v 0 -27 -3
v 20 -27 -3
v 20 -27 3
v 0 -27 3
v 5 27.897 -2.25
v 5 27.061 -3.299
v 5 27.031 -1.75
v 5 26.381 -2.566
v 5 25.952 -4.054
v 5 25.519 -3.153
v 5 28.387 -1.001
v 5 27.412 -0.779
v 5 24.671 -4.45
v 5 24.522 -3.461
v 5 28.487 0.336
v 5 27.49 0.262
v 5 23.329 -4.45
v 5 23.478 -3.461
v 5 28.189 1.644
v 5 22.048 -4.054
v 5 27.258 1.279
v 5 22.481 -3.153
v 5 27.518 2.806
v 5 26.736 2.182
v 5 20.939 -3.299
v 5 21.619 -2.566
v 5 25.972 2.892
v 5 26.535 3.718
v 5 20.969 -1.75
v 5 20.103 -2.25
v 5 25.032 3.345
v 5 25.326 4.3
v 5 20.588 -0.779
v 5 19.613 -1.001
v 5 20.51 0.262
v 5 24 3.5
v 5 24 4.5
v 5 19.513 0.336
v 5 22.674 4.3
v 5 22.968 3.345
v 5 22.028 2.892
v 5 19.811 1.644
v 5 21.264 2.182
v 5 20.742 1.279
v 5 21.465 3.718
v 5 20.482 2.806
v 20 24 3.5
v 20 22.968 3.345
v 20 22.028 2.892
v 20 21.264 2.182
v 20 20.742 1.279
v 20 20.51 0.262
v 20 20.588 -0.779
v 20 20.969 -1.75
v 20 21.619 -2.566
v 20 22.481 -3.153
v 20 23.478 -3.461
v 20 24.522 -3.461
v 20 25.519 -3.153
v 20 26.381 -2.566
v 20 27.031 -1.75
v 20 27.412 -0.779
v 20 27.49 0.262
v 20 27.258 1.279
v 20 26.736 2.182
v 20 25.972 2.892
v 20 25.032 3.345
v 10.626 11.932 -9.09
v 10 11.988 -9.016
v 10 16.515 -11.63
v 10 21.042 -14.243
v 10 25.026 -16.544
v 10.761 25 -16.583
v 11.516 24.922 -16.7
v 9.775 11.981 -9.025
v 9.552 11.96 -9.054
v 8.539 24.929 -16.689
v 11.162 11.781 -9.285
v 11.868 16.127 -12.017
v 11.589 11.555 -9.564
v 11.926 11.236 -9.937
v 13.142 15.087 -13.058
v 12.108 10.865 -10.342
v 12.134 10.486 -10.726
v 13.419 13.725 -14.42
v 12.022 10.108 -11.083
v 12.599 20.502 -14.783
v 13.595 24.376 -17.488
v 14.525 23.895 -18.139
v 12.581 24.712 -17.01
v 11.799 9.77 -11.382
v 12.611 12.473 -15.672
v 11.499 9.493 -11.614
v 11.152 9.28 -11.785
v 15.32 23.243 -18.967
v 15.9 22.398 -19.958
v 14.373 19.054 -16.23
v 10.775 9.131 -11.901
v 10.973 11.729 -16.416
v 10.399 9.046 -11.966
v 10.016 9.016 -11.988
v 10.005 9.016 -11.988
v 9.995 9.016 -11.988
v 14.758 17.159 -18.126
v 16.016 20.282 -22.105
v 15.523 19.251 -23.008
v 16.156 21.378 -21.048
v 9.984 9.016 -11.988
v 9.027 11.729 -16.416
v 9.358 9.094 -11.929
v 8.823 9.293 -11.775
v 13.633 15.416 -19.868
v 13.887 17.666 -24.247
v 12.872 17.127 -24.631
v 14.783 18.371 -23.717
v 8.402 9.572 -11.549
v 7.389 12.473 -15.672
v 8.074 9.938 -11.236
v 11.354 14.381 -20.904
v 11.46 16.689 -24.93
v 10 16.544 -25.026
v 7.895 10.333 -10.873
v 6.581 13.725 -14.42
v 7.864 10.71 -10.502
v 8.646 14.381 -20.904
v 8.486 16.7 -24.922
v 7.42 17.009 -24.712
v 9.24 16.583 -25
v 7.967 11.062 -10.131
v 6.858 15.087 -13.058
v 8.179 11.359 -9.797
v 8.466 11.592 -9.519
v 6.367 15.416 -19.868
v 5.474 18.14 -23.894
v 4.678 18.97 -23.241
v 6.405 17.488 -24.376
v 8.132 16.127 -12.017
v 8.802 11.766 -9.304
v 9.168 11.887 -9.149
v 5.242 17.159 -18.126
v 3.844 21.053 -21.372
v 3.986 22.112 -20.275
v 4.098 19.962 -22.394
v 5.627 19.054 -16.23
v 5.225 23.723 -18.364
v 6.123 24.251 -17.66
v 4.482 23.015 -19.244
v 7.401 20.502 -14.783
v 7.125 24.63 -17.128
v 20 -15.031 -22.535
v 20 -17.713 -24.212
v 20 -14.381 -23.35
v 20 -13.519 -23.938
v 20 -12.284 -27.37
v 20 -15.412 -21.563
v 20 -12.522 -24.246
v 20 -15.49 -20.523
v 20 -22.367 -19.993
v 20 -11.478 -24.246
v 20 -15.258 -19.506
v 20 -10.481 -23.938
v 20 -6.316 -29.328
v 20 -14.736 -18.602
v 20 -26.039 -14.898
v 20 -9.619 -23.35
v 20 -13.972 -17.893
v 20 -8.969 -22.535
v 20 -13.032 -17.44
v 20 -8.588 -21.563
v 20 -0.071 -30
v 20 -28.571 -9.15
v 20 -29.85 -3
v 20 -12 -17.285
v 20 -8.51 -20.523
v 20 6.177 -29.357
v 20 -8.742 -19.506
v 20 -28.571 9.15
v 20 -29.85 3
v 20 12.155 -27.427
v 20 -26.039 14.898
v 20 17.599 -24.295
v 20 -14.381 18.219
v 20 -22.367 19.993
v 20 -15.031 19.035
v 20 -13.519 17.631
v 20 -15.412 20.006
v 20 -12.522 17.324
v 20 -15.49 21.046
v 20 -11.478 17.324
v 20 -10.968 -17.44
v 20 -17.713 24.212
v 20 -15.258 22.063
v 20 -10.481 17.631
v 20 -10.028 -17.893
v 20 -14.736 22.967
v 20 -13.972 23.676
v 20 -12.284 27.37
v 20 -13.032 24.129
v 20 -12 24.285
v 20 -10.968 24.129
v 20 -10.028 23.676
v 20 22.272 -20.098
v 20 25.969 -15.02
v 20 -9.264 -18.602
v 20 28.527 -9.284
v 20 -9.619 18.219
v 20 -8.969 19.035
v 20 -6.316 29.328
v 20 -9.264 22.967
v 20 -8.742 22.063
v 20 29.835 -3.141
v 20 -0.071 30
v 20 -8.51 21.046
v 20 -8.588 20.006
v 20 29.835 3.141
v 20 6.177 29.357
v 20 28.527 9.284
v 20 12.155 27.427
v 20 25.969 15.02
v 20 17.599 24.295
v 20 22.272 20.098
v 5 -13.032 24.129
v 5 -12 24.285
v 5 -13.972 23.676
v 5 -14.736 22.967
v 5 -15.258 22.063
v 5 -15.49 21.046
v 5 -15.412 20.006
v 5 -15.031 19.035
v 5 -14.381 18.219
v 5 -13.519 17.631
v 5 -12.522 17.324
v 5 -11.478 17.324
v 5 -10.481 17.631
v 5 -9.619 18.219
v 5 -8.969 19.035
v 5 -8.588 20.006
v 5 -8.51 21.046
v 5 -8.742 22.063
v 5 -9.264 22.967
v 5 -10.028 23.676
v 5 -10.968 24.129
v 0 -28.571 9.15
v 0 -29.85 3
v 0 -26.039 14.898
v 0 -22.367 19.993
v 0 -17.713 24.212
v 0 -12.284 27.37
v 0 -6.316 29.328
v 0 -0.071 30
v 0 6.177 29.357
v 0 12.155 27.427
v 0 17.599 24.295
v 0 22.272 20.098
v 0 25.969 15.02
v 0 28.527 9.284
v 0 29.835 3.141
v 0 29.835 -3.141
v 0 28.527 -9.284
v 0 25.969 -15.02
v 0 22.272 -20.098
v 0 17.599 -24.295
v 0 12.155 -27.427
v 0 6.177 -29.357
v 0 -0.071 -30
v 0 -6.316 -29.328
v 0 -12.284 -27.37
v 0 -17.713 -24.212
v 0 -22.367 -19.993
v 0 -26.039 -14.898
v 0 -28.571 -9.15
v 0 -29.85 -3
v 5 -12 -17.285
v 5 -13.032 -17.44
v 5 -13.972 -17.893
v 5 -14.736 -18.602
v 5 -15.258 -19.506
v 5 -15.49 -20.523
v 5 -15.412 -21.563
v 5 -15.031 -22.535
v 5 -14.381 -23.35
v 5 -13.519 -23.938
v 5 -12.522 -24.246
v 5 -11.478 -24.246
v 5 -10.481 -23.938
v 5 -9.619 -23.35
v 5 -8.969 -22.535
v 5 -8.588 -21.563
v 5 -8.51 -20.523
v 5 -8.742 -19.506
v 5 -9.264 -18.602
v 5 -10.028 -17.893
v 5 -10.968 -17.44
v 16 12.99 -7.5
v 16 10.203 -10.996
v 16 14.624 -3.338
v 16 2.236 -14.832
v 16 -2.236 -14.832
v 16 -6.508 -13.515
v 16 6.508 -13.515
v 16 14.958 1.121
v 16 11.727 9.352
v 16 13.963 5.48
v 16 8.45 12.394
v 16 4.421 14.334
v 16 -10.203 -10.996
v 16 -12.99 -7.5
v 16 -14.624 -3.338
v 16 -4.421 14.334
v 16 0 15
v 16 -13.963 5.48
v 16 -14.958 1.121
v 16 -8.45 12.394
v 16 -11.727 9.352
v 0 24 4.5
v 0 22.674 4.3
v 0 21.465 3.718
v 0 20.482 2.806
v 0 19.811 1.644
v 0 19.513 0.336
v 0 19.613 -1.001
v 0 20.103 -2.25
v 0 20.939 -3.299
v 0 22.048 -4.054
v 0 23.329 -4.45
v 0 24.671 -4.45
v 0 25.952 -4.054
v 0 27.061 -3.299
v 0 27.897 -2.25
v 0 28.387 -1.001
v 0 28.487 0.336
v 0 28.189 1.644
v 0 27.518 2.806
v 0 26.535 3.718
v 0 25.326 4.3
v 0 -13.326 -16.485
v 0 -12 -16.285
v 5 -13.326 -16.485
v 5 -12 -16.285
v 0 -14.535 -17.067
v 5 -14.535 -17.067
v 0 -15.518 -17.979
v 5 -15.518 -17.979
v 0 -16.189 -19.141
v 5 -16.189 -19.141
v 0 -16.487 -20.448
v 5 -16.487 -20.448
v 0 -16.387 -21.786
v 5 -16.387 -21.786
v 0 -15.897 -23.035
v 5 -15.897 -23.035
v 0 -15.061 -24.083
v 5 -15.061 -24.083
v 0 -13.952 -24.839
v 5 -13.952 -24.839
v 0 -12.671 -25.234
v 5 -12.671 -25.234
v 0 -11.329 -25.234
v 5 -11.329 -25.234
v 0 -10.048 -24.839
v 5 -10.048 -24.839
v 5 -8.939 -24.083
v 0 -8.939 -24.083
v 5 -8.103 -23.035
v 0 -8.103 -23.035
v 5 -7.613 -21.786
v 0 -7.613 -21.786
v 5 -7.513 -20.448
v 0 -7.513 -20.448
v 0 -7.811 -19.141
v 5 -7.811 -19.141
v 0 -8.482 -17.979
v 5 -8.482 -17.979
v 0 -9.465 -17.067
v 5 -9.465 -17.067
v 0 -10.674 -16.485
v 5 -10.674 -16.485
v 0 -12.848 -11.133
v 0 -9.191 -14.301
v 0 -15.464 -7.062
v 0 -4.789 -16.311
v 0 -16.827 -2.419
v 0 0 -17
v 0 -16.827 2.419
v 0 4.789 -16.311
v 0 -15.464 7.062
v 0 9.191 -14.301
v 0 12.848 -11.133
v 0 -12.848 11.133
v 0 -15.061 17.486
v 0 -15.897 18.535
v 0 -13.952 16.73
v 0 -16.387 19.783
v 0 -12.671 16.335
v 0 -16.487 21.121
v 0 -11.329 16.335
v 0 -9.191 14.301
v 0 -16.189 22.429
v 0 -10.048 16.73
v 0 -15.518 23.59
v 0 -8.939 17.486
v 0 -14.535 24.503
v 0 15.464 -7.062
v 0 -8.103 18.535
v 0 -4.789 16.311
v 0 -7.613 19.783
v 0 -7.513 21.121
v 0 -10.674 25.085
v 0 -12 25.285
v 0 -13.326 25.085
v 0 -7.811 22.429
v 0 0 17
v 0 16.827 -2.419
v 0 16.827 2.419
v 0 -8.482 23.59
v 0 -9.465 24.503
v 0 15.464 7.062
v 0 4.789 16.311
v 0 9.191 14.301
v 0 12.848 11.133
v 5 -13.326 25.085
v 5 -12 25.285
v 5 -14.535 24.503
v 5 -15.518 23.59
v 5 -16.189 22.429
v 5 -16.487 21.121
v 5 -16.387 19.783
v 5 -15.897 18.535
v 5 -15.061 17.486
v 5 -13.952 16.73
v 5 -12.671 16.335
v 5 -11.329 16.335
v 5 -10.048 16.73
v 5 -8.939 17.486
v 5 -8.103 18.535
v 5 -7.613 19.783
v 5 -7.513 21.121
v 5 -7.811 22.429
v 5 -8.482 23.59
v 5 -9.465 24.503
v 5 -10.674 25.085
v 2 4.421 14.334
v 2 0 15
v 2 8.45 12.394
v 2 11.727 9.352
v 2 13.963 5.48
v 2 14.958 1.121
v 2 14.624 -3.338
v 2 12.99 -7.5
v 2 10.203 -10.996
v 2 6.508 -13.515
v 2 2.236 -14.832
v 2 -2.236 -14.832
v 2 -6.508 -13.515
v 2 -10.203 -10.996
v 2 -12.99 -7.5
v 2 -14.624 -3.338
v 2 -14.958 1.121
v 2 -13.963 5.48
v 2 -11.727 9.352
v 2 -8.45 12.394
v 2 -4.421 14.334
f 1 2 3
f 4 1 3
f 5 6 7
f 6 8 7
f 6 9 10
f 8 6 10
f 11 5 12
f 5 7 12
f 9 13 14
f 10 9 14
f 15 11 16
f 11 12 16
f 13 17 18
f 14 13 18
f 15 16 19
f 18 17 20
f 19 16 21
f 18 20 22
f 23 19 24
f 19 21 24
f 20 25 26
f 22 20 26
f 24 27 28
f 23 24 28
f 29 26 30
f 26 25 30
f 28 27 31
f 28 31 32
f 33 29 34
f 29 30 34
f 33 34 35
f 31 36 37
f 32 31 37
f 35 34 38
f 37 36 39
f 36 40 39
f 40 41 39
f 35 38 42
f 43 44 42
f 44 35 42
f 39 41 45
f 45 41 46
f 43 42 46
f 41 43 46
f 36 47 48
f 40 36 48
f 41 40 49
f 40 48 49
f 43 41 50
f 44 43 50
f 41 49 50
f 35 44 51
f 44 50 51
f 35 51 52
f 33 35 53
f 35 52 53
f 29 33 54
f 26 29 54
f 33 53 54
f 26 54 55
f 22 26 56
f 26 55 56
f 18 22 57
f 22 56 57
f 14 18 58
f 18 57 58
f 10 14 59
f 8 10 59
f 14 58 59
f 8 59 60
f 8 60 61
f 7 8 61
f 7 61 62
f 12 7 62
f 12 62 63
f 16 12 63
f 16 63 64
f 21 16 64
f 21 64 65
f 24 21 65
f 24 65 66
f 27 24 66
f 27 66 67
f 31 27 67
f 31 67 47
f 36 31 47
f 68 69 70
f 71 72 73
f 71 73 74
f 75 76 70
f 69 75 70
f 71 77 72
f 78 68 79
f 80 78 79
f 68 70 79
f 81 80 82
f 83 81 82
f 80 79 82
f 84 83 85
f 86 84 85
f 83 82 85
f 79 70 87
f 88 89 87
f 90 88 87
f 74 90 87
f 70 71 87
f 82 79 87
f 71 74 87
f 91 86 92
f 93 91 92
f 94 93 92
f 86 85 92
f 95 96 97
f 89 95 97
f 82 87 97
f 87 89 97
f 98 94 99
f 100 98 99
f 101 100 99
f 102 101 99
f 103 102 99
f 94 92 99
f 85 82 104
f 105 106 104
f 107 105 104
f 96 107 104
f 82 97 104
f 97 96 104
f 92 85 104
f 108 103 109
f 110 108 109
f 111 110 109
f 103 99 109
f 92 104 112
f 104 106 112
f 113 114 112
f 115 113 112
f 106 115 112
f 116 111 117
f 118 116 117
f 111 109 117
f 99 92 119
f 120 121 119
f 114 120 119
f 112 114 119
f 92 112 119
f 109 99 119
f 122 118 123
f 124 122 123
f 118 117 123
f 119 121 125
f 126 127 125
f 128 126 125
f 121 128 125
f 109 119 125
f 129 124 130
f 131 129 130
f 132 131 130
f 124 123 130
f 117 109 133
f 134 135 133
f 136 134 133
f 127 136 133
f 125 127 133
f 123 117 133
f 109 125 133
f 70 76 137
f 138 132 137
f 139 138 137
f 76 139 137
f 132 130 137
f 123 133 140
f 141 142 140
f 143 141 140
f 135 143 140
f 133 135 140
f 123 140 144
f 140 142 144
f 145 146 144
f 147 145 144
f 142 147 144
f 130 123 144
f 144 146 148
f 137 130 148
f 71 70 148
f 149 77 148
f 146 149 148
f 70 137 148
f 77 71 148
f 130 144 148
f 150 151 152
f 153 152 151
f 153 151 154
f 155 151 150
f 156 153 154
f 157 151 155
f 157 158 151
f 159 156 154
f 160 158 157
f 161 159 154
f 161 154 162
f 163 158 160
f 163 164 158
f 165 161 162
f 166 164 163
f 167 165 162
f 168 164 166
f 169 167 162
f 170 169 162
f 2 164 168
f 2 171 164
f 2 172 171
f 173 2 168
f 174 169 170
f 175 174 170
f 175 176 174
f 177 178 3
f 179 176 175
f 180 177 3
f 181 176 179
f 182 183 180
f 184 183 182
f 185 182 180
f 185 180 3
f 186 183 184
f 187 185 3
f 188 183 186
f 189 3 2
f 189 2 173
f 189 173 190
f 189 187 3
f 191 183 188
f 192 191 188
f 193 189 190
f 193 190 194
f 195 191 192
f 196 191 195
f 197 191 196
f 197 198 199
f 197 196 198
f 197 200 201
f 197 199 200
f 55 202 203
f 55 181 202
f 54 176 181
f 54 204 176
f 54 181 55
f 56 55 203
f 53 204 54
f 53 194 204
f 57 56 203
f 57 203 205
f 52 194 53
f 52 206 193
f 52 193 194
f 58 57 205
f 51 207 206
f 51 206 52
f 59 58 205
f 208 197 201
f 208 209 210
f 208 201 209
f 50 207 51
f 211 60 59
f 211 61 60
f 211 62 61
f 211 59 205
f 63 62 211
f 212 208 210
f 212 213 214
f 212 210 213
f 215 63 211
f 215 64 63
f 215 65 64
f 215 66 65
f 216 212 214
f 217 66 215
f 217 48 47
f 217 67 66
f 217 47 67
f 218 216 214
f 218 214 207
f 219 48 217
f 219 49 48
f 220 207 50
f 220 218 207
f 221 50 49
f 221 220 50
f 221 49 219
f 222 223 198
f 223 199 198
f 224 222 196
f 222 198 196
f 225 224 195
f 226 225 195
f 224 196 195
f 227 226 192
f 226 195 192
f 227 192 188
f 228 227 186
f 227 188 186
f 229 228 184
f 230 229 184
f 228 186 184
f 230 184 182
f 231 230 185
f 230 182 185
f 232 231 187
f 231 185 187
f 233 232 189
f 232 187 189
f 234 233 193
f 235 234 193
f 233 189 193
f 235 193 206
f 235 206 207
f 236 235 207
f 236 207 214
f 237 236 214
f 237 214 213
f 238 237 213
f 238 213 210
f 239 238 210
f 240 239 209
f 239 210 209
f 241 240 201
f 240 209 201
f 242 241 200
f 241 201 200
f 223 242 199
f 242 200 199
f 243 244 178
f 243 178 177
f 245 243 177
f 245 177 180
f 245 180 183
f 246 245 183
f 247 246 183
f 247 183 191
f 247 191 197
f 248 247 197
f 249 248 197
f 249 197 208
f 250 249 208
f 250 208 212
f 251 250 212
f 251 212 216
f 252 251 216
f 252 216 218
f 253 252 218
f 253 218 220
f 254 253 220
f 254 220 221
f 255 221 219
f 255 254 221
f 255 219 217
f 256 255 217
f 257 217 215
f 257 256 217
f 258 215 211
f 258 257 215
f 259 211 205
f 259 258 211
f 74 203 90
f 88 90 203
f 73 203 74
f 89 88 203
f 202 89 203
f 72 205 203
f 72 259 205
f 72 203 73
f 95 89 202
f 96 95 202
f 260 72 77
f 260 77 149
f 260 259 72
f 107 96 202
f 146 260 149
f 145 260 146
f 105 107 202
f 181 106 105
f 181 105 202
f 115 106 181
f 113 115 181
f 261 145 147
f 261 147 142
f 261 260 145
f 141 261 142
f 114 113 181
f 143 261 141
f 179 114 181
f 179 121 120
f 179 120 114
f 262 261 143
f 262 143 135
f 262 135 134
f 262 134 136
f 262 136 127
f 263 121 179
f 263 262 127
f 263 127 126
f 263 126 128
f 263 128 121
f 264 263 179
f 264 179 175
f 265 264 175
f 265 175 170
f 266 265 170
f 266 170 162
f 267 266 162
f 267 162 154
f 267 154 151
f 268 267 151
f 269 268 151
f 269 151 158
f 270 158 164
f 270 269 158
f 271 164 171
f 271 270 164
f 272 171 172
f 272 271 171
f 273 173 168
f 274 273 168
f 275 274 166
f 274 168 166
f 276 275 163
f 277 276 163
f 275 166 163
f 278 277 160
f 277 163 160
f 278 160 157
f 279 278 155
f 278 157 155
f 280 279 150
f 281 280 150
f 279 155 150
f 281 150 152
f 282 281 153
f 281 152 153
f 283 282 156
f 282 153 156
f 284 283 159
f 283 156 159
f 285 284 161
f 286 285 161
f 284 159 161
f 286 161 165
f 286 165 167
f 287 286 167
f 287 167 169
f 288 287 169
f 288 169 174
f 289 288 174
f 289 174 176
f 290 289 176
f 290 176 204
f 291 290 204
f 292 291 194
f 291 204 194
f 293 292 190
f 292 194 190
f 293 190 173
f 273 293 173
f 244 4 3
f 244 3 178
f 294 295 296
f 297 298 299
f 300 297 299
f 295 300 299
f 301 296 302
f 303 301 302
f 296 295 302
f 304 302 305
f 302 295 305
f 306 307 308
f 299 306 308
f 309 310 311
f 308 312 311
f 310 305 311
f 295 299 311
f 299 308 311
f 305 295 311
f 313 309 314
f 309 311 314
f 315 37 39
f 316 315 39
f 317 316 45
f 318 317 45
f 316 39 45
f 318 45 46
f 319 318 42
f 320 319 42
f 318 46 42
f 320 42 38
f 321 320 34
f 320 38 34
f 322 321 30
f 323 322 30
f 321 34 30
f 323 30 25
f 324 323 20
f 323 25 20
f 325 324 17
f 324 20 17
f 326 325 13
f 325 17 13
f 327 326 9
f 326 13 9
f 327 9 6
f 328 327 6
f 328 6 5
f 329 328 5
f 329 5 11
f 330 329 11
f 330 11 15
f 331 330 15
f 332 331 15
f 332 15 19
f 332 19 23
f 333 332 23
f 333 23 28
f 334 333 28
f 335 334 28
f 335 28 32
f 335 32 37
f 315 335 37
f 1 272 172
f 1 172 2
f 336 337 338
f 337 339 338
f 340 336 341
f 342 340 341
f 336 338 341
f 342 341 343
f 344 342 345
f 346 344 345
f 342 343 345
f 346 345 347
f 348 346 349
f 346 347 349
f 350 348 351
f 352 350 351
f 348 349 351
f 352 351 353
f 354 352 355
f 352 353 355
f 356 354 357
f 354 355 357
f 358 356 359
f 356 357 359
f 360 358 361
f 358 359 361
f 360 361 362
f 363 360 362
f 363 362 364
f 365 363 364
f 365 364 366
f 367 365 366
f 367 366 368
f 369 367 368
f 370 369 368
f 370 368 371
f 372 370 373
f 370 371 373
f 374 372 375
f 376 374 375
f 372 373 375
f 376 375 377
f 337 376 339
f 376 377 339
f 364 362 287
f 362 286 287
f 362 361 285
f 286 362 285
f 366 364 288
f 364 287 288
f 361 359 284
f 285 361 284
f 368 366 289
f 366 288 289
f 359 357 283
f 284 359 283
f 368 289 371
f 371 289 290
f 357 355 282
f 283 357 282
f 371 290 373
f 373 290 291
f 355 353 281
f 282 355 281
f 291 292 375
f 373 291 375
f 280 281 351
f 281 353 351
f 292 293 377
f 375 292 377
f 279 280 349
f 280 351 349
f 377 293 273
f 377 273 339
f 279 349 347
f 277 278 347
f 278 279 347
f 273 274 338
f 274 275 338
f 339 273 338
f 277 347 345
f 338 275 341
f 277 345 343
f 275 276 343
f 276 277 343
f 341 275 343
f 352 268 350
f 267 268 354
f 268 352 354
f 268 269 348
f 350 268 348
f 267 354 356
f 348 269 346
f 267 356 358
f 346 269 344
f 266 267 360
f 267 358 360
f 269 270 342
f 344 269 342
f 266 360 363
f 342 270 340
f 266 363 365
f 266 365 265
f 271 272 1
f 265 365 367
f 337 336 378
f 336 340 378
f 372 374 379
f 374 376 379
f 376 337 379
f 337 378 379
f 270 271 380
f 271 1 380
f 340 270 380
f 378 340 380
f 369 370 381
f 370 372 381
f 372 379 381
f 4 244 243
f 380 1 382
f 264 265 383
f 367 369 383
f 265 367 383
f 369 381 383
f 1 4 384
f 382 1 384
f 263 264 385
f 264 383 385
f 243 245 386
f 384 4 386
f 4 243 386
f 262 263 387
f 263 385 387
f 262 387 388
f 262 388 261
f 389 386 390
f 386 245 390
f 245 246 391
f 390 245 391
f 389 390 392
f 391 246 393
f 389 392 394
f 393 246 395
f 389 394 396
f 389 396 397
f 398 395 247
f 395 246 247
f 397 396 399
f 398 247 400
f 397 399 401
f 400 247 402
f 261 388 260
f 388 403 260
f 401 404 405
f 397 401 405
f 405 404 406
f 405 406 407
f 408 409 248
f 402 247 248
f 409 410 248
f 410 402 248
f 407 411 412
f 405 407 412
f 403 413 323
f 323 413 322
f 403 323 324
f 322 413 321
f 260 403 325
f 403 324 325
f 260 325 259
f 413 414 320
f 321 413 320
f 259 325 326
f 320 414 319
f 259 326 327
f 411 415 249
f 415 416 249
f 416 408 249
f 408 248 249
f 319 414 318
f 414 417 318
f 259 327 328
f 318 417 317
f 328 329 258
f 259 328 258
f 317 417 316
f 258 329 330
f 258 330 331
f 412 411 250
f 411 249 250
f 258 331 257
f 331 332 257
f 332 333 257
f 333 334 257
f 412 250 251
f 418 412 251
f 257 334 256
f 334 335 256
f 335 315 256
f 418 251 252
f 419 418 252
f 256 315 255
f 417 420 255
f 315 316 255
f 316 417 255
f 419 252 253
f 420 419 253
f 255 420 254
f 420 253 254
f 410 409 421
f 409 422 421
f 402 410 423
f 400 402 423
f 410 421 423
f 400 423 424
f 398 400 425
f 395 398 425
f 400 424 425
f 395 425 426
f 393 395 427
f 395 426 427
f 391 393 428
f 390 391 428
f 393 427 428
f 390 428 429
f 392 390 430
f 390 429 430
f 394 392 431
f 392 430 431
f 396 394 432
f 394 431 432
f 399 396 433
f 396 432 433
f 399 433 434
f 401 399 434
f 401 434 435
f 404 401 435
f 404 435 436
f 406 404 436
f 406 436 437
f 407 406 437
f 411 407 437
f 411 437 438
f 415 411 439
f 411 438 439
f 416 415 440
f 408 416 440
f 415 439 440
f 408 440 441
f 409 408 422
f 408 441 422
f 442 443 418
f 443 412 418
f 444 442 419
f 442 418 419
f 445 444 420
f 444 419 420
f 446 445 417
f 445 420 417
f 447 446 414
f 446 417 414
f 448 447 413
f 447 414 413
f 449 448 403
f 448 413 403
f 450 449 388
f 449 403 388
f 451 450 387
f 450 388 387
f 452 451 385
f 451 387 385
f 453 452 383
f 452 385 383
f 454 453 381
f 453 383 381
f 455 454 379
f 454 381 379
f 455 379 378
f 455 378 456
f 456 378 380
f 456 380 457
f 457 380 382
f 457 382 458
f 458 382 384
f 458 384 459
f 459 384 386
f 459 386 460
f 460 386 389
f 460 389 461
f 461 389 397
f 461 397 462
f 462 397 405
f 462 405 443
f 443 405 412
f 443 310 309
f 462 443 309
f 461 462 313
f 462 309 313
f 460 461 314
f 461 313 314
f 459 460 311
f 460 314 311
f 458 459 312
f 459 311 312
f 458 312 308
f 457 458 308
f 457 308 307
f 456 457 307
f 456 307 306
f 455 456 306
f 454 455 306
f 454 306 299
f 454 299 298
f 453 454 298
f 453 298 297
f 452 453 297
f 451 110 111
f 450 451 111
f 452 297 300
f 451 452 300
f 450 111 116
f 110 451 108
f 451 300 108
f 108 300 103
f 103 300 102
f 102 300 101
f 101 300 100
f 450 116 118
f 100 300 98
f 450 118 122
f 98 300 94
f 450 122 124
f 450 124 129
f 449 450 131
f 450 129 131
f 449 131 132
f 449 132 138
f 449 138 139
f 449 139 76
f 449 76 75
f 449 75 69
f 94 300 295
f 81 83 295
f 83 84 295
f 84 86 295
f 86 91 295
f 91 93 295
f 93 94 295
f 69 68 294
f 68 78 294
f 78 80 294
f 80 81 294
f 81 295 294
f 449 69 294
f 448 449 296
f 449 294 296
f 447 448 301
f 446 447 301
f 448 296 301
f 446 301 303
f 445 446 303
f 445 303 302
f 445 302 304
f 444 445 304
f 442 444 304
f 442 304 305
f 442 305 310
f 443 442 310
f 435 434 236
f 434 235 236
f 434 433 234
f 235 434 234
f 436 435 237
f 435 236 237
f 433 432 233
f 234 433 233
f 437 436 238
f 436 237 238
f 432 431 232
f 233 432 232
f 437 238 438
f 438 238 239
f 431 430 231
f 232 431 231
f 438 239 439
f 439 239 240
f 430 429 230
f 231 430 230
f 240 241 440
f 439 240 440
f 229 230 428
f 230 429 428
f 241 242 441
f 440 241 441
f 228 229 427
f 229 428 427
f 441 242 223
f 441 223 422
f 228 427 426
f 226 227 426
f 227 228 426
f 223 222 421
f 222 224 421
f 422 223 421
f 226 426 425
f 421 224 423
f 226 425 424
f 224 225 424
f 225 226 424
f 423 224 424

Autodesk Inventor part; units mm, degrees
ref_plane "YZ Plane" through (0, 0, 0) normal (1, 0, 0) x (0, 1, 0)
ref_plane "XZ Plane" through (0, 0, 0) normal (0, 1, 0) x (-1, 0, 0)
sketch "Эскиз1" plane through (0, 0, 0) normal (0, 0, 1) x (1, 0, 0)
  line L0 (0, 0) -> (20, 0)
  line L1 (20, 0) -> (20, 30)
  line L2 (20, 30) -> (0, 30)
  line L3 (0, 30) -> (0, 0)
  dimension "d0" = 20
  dimension "d1" = 30
revolve "Вращение1" add sketch "Эскиз1" angle 360 about axis through (0, 0, 0) along (1, 0, 0)
sketch "Эскиз2" plane through (0, 0, 0) normal (-1, 0, 0) x (0, 0, 1)
  point P0 (0, 0)
  point P1 (0, 24)
  point P2 (-20.7846, -12)
  point P3 (20.7846, -12)
  dimension "d3" = 24
  dimension "d6" = 360
hole "Отверстие1" at (0, 24, 0) at (0, -12, -20.7846) at (0, -12, 20.7846) direction (1, 0, 0) diameter 7 end through all counterbore diameter 9 counterbore depth 5
sketch "Эскиз3" plane through (0, 0, 0) normal (-1, 0, 0) x (0, 0, 1)
  point P0 (0, 0)
  point P1 (0, 0)
hole "Отверстие2" at (0, 0, 0) direction (1, 0, 0) diameter 30 depth 16 countersink diameter 34 countersink angle 90
sketch "Эскиз4" plane through (0, 0, 0) normal (-1, 0, 0) x (0, 0, 1)
  circle A0 centre (0, 0) radius 30 construction
  line L0 (-3, -27) -> (3, -27)
  line L1 (3, -27) -> (3, -29.8496)
  line L2 (-3, -29.8496) -> (-3, -27)
  arc A1 (-3, -29.8496) -> (3, -29.8496) centre (0, 0) ccw
  point P0 (0, -27)
  dimension "d22" = 6
  dimension "d23" = 27
extrude "Выдавливание1" cut sketch "Эскиз4" against normal blind 20
ref_plane "РабПлоскость1" through (10, -29.8496, -3) normal (-1, 0, 0) x (0, 0, 1)
sketch "Эскиз5" plane through (10, -29.8496, -3) normal (-1, 0, 0) x (0, 0, 1)
  line L0 (3, 29.8496) -> (-21.7487, 54.5984) construction
  line L1 (3, 29.8496) -> (33, 29.8496) construction
  arc A0 (6, 0) -> (0, 0) centre (3, 29.8496) ccw construction
  circle A1 centre (3, 29.8496) radius 15 construction
  arc A2 (-6.0161, 41.8375) -> (-8.9879, 38.8657) centre (3, 29.8496) ccw
  line L2 (-7.6066, 40.4562) -> (-21.7487, 54.5984)
  line L3 (-6.0161, 41.8375) -> (-16.4454, 59.9017)
  line L4 (-8.9879, 38.8657) -> (-27.052, 49.2951)
  line L5 (-27.052, 49.2951) -> (-16.4454, 59.9017)
  dimension "d27" = 135
  dimension "d32" = 15
  dimension "d33" = 15
  dimension "d34" = 20
  dimension "d35" = 15
revolve "Вращение3" cut sketch "Эскиз5" angle 360 about axis through (10, 0, 0) along (0, 0.7071068, -0.7071068) contours A2 L2 L5 L3
properties part number "711124"
